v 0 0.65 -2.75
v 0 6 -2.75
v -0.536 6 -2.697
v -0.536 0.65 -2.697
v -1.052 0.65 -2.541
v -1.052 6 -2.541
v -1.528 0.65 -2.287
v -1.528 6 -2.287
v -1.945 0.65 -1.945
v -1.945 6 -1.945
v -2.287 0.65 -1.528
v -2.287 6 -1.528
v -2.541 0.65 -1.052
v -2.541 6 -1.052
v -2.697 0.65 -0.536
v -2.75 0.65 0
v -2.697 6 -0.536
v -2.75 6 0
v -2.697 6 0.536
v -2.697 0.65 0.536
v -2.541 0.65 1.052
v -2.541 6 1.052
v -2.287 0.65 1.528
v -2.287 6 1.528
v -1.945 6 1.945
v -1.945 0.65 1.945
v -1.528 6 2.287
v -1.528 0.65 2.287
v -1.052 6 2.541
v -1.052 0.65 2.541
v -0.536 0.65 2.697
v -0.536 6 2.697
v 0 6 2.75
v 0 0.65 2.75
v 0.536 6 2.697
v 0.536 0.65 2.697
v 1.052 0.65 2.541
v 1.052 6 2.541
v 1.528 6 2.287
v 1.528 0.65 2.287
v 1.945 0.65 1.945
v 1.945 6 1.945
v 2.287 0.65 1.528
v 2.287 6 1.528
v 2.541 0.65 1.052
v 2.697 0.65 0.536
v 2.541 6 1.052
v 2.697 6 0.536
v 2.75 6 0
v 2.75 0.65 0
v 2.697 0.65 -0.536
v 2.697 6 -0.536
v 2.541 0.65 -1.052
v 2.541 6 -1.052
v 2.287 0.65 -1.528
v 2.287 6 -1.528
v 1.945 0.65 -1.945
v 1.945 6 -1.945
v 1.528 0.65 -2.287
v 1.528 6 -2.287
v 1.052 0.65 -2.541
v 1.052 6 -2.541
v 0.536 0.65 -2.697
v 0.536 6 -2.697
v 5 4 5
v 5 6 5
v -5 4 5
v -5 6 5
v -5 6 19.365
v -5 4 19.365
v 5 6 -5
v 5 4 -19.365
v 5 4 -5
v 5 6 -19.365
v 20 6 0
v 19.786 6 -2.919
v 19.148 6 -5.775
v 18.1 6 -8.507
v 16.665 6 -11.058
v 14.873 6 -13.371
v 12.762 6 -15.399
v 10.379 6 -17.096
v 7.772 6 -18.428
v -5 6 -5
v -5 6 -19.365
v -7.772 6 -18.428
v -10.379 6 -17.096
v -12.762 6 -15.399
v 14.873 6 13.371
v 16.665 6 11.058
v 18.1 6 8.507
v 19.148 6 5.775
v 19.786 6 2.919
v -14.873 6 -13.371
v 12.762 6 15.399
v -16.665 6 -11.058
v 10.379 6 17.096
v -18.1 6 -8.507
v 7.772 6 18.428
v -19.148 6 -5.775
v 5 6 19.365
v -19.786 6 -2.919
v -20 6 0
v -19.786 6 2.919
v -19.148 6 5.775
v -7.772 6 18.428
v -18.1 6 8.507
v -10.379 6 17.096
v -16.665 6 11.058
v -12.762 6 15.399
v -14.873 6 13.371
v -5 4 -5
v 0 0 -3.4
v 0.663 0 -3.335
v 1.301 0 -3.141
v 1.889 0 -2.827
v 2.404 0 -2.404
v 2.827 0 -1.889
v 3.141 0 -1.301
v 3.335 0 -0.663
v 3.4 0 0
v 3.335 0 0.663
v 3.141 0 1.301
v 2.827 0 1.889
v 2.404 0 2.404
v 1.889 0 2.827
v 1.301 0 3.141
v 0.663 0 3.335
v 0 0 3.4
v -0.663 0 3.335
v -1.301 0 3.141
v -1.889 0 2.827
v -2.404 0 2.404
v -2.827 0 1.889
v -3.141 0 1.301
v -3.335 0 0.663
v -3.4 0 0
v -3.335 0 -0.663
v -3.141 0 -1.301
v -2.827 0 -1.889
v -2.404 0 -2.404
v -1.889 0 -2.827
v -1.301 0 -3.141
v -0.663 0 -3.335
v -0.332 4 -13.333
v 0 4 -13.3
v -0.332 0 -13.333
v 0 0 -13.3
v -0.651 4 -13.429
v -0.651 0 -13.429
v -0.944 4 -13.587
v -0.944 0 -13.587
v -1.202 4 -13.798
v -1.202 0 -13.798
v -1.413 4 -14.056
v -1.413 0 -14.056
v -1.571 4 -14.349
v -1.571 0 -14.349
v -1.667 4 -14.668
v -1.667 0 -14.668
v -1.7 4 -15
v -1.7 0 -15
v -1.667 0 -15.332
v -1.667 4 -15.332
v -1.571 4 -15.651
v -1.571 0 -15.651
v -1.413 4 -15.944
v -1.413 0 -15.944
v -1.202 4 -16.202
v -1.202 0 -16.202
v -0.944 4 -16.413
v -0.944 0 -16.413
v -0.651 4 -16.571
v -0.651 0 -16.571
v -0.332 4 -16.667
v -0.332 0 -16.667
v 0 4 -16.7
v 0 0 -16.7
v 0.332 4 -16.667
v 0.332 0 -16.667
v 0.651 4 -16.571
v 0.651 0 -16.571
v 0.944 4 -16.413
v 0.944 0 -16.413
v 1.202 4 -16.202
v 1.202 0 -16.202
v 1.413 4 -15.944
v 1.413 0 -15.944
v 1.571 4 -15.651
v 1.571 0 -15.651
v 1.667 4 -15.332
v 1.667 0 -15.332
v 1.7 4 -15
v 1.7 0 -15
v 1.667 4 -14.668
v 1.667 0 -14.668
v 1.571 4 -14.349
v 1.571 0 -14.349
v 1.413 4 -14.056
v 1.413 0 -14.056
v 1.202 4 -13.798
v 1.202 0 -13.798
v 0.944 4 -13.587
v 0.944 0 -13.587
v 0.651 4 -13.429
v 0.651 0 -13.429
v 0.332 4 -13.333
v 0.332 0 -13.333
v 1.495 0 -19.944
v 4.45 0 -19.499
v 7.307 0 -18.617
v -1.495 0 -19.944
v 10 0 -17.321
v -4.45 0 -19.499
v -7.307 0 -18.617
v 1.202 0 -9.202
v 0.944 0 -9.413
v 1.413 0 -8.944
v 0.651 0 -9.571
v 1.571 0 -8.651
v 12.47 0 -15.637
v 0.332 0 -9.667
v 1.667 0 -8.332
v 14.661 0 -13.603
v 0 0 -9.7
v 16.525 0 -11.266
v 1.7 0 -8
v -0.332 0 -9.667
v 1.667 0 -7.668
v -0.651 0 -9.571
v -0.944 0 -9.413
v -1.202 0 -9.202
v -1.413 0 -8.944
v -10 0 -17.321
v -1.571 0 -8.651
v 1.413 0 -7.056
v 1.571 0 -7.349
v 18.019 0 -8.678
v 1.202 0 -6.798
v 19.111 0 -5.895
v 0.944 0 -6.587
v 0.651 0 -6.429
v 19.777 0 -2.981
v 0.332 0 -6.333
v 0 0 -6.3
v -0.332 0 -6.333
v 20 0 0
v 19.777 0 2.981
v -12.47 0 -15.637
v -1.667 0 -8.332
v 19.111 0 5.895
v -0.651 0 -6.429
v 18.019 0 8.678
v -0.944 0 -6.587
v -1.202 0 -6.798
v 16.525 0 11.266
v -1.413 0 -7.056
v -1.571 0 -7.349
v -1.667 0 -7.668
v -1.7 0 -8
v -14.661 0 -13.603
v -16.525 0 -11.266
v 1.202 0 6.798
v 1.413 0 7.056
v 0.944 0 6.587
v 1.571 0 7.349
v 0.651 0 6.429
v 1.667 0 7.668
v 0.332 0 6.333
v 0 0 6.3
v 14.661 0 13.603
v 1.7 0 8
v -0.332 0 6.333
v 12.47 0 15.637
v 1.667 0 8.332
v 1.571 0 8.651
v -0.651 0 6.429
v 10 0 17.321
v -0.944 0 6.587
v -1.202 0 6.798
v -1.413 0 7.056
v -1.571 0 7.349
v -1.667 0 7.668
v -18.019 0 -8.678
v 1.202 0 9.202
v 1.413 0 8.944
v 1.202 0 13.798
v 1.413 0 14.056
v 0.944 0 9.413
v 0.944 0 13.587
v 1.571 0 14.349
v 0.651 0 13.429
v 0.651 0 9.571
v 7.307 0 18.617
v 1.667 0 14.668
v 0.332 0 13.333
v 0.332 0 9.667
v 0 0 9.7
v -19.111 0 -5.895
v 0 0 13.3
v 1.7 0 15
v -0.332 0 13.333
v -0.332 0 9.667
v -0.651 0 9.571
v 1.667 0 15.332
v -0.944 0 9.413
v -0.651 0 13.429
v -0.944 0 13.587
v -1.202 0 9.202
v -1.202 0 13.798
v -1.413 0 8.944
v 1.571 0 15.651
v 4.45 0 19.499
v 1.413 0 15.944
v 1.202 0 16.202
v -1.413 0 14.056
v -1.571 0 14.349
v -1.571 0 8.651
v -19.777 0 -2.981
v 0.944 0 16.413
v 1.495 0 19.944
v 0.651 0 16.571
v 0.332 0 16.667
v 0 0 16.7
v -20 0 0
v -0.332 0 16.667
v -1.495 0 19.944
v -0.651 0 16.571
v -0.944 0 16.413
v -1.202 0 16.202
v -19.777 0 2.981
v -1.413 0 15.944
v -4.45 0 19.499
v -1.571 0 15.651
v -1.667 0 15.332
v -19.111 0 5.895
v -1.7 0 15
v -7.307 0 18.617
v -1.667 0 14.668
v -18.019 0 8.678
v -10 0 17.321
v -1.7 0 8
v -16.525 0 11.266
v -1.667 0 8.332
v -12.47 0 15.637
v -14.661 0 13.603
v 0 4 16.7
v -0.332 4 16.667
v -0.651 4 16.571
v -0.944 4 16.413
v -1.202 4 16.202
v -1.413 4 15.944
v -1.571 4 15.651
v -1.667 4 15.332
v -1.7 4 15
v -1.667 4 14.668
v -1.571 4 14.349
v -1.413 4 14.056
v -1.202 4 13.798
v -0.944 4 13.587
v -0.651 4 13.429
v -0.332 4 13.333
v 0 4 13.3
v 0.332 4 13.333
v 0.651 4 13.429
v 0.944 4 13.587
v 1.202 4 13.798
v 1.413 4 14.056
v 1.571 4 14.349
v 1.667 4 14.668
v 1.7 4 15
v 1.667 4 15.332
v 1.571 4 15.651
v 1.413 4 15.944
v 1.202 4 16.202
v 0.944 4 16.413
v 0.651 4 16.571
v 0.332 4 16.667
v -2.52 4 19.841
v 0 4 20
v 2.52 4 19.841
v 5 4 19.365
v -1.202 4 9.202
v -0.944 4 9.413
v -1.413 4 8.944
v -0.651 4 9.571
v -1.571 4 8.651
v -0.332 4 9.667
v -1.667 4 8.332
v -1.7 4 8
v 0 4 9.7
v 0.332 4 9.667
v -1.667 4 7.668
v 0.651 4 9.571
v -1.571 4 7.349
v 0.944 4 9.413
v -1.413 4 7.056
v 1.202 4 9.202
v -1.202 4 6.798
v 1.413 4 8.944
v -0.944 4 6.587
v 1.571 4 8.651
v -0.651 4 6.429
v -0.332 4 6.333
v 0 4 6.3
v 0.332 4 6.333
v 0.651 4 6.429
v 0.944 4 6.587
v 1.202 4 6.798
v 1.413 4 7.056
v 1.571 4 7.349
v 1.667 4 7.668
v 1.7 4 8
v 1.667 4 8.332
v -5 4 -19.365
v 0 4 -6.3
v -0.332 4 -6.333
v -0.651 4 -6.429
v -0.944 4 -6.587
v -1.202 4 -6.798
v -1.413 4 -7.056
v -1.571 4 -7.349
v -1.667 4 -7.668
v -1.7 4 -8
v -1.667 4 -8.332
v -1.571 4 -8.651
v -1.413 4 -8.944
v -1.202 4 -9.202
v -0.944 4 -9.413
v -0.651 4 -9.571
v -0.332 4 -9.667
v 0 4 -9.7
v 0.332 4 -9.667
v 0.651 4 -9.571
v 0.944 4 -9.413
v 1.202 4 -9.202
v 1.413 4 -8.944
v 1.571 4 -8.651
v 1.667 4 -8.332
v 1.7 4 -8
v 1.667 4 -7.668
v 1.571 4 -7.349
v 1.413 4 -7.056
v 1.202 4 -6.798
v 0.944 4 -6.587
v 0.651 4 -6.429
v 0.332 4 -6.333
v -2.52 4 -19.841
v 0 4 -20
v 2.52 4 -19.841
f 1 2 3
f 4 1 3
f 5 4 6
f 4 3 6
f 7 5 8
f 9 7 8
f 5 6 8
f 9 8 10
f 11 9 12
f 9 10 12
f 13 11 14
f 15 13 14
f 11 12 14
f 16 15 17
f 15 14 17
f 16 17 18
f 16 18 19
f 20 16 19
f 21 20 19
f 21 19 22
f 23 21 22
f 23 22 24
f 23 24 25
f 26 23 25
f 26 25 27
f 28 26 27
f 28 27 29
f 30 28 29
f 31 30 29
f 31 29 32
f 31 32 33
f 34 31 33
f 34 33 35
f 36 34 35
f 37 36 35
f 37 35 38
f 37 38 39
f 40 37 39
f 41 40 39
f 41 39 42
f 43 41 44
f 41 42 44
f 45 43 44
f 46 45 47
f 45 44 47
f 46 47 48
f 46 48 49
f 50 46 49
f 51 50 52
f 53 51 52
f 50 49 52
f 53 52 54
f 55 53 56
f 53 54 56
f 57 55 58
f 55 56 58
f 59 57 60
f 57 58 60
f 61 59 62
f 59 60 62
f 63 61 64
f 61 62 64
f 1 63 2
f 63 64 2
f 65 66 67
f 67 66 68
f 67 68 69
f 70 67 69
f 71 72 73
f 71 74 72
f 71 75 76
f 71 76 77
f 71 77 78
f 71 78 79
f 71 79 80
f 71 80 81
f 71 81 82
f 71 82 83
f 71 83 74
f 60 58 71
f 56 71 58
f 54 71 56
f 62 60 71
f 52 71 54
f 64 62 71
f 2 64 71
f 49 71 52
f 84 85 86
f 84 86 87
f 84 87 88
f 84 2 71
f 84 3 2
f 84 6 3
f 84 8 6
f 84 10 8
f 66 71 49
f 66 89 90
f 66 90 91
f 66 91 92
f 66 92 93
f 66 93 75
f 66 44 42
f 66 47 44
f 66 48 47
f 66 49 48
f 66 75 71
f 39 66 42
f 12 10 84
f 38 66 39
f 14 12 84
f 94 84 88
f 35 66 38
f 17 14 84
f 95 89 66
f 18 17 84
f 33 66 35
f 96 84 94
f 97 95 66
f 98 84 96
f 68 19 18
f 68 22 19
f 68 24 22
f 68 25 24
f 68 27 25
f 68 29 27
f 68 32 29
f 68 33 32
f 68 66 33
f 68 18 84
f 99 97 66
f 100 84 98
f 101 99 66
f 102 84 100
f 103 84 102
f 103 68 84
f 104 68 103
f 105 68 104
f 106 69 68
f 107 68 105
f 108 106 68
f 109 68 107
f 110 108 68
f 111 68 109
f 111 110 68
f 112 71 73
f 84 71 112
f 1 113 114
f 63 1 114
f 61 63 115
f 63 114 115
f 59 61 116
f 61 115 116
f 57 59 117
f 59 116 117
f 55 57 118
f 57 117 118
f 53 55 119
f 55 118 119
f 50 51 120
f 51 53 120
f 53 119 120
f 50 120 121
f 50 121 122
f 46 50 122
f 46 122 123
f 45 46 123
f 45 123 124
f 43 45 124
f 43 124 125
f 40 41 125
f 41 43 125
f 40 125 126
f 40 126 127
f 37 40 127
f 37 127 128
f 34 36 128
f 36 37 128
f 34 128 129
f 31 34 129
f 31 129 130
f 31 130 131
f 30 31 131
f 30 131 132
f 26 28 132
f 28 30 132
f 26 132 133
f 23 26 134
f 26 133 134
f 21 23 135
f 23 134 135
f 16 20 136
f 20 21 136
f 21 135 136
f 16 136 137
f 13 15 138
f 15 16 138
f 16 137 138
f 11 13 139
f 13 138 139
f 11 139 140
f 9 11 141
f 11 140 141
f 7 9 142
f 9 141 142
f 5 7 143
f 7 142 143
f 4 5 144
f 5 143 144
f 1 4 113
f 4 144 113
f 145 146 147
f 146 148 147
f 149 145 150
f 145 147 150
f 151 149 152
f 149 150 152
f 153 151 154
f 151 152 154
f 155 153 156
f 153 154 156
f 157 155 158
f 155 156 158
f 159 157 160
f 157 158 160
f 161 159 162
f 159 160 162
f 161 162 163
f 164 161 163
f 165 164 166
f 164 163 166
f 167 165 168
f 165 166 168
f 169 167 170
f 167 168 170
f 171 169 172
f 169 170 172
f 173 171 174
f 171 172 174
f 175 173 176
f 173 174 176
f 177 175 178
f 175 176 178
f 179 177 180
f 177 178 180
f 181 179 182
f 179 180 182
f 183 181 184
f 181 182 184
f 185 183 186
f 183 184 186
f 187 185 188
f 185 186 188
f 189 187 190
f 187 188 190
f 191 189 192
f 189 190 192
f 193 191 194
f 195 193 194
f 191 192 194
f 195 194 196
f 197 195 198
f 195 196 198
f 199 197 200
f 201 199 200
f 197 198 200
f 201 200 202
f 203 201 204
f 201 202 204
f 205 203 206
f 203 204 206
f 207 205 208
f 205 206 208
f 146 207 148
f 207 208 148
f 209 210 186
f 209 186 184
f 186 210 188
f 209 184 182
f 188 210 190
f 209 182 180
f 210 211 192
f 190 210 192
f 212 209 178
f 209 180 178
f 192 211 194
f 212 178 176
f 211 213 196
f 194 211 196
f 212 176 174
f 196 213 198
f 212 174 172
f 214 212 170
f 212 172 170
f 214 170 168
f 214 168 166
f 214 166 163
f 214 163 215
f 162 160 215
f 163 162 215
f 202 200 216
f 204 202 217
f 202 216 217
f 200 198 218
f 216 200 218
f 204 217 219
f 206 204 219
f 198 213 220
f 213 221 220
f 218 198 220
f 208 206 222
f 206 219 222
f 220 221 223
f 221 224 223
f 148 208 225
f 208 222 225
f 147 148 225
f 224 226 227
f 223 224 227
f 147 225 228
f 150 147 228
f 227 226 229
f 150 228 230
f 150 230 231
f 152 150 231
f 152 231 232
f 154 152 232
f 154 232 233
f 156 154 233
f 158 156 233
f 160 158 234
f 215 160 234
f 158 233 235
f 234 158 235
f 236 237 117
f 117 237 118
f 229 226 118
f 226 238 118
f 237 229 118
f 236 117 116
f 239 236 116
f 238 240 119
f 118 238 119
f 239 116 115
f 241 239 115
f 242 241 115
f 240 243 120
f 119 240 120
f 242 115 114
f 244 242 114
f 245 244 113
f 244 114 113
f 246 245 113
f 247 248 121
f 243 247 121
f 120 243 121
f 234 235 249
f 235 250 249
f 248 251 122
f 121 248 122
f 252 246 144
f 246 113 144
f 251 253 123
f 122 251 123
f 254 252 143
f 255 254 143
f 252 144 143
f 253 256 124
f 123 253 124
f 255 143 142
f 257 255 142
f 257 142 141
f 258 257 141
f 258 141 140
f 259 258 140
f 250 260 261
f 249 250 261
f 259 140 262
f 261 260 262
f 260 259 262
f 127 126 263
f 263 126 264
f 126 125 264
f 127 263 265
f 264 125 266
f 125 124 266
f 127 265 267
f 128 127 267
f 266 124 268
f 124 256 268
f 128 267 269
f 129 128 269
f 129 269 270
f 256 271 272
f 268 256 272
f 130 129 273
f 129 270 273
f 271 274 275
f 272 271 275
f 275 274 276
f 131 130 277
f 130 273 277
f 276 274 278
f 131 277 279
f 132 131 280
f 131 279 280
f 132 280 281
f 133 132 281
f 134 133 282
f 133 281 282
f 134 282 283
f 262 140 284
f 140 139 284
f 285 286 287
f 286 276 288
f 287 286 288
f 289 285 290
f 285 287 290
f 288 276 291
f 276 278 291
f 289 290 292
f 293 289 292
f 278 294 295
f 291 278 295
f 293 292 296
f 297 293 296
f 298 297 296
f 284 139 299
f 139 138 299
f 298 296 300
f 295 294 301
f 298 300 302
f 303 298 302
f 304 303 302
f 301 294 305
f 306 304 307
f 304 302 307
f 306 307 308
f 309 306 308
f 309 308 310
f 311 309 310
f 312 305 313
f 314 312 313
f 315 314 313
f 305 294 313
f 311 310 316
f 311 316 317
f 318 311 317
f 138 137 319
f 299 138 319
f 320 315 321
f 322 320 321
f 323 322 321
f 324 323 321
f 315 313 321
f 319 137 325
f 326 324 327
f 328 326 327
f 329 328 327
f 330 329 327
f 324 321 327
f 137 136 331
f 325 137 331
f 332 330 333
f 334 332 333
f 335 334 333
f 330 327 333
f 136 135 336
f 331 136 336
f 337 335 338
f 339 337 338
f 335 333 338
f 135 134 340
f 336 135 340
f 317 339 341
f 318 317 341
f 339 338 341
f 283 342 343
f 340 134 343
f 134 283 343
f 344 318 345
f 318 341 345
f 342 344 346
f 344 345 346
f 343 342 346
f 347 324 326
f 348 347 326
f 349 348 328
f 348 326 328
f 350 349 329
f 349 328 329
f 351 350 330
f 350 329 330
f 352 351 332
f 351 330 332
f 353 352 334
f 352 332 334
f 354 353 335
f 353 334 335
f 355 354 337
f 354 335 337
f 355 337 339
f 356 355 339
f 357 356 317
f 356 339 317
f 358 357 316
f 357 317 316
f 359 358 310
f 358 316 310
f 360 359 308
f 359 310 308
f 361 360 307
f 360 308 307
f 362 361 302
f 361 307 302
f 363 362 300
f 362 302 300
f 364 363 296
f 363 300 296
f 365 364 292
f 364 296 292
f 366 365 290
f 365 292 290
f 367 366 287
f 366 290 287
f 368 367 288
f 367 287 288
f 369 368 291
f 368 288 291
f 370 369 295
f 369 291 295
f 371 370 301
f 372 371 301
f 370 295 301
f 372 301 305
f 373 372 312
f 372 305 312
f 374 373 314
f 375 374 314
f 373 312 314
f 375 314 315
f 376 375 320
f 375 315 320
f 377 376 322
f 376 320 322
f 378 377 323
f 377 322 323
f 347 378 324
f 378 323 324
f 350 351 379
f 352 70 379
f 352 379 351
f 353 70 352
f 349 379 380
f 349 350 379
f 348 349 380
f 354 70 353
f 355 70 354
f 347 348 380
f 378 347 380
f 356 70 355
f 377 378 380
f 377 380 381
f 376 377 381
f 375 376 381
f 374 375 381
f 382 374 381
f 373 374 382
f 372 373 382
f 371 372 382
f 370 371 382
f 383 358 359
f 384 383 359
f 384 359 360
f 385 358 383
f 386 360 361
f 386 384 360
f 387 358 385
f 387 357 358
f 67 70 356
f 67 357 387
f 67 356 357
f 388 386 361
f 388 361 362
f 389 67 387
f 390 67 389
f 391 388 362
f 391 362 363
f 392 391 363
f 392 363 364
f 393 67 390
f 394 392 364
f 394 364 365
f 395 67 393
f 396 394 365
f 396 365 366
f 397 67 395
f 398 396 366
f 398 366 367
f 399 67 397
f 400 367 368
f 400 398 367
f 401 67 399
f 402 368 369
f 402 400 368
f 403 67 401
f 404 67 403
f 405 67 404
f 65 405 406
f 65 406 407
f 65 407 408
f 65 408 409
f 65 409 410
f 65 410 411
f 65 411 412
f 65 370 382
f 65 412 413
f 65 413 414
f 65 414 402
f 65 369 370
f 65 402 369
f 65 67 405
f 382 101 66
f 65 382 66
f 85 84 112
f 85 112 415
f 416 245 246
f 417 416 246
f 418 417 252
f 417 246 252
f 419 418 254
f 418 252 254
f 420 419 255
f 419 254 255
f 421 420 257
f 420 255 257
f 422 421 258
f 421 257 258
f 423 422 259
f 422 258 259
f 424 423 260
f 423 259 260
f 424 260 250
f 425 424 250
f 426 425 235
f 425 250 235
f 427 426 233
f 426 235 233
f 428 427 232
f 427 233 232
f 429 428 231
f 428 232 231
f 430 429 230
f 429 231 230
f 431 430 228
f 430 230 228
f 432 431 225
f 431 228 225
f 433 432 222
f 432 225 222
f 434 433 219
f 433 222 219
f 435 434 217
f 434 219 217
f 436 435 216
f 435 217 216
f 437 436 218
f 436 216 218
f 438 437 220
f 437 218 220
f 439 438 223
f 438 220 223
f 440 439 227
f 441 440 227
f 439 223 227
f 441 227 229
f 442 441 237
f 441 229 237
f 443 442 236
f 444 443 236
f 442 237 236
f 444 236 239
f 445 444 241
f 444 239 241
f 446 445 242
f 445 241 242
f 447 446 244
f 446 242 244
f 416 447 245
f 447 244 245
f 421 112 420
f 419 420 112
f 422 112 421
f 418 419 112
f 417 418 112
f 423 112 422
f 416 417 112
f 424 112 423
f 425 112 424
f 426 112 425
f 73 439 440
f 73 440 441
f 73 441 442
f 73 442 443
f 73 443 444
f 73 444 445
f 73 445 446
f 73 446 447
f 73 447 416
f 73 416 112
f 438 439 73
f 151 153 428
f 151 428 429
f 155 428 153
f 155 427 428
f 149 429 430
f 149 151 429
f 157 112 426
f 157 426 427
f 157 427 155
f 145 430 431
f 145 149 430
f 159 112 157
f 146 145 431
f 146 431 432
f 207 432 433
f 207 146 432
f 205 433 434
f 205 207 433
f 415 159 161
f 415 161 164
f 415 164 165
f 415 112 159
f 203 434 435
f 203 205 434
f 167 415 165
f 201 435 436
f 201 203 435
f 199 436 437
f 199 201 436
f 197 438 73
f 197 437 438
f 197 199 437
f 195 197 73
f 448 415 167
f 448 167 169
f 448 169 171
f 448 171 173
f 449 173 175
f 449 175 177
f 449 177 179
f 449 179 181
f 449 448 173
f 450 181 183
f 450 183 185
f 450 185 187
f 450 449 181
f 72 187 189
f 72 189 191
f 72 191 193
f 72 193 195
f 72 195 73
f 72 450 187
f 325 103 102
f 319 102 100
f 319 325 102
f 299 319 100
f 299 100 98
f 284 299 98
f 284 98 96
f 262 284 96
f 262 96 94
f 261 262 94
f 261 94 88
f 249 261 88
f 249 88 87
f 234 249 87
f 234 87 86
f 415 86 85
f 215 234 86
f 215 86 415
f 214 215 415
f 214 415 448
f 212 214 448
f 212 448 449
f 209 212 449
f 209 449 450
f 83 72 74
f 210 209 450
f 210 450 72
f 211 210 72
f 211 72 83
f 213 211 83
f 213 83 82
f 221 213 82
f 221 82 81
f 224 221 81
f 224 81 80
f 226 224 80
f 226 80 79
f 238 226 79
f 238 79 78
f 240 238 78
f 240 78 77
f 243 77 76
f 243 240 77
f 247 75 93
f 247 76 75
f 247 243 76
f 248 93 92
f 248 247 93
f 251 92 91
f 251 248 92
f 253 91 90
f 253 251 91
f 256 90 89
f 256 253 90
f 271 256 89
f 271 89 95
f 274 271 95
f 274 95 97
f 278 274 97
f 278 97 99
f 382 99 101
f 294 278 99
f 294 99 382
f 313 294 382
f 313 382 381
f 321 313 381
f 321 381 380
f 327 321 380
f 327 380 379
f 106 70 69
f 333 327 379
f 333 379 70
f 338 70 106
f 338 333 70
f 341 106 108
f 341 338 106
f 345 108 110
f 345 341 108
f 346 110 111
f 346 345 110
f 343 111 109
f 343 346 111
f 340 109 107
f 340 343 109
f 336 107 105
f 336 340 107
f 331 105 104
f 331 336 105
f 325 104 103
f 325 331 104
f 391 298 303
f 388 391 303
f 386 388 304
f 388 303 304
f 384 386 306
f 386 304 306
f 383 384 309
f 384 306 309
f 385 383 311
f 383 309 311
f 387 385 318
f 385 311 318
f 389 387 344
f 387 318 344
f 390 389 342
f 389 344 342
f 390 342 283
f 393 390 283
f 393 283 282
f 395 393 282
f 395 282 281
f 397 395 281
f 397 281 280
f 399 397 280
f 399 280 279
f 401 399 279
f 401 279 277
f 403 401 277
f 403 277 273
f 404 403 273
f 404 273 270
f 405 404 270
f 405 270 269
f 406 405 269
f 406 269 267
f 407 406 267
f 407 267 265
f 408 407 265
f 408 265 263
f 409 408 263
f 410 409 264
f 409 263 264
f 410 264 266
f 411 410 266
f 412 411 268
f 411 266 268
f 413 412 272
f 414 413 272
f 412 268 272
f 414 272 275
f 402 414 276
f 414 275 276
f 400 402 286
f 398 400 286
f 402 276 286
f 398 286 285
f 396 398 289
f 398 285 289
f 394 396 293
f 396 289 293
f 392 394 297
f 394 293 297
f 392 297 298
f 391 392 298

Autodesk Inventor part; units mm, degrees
ref_plane "YZ Plane" through (0, 0, 0) normal (1, 0, 0) x (0, 1, 0)
ref_plane "XZ Plane" through (0, 0, 0) normal (0, 1, 0) x (-1, 0, 0)
ref_plane "XY Plane" through (0, 0, 0) normal (0, 0, 1) x (1, 0, 0)
sketch "Sketch1" plane through (0, 0, 0) normal (0, 1, 0) x (-1, 0, 0)
  circle A0 centre (0, 0) radius 20
  dimension "d0" = 40
extrude "Extrusion1" add sketch "Sketch1" along normal blind 6
sketch "Sketch3" plane through (0, 6, 0) normal (0, 1, 0) x (1, 0, 0)
  line L0 (0, 0) -> (0, 20)
  circle A0 centre (0, 0) radius 20 projected
  line L1 (5, 35) -> (5, 5)
  line L2 (5, 5) -> (-5, 5)
  line L3 (-5, 5) -> (-5, 35)
  line L4 (-5, 35) -> (5, 35)
  line L5 (5, 35) -> (-5, 5) construction
  line L6 (5, 5) -> (-5, 35) construction
  line L7 (20, 0) -> (-20, 0) construction
  line L8 (5, -35) -> (5, -5)
  line L9 (5, -5) -> (-5, -5)
  line L10 (-5, -5) -> (-5, -35)
  line L11 (-5, -35) -> (5, -35)
  point P0 (-5, 19.3649)
  point P1 (5, 19.3649)
  point P2 (-5, -19.3649)
  point P3 (5, -19.3649)
  dimension "d11" = 30
  dimension "d12" = 10
extrude "Extrusion2" cut sketch "Sketch3" against normal blind 2 contours L2 L3 A0 L0 | L0 A0 L1 L2 | L10 L9 L8 A0
sketch "Sketch5" plane through (0, 4, 0) normal (0, 1, 0) x (1, 0, 0)
  circle A0 centre (0, -8) radius 1
  circle A1 centre (0, -15) radius 1
  line L0 (-5, -5) -> (5, -5) projected
  arc A2 (-5, 19.3649) -> (-5, -19.3649) centre (0, 0) ccw projected
  line L1 (-20, 0) -> (20, 0) construction
  arc A3 (5, -19.3649) -> (5, 19.3649) centre (0, 0) ccw projected
  circle A4 centre (0, 8) radius 1
  circle A5 centre (0, 15) radius 1
  line L2 (5, 5) -> (-5, 5) projected
  line L3 (5, 19.3649) -> (5, 5) projected
  dimension "d20" = 2
  dimension "d21" = 2
  dimension "d22" = 3
  dimension "d23" = 7
  dimension "d39" = 3
  dimension "d40" = 5
  dimension "d41" = 5
hole "Hole2" at (0, 4, 15) at (0, 4, 8) at (0, 4, -8) at (0, 4, -15) direction (0, -1, 0) diameter 3.4 depth 10.979 tip angle 118 clearance for "Flat Head Machine Screw" size "M3" standard "Ansi Metric M Profile"
sketch "Sketch6" plane through (0, 0, 0) normal (0, -1, 0) x (1, 0, 0)
  circle A0 centre (0, 0) radius 1.5
  dimension "d31" = 3
hole "Hole3" at (0, 0, 0) direction (0, 1, 0) diameter 5.5 depth 8.8 tip angle 118 countersink diameter 6.8 countersink angle 90 clearance for "Flat Head Machine Screw" size "M5" standard "Ansi Metric M Profile"
properties part number "prop_retaining_part"
